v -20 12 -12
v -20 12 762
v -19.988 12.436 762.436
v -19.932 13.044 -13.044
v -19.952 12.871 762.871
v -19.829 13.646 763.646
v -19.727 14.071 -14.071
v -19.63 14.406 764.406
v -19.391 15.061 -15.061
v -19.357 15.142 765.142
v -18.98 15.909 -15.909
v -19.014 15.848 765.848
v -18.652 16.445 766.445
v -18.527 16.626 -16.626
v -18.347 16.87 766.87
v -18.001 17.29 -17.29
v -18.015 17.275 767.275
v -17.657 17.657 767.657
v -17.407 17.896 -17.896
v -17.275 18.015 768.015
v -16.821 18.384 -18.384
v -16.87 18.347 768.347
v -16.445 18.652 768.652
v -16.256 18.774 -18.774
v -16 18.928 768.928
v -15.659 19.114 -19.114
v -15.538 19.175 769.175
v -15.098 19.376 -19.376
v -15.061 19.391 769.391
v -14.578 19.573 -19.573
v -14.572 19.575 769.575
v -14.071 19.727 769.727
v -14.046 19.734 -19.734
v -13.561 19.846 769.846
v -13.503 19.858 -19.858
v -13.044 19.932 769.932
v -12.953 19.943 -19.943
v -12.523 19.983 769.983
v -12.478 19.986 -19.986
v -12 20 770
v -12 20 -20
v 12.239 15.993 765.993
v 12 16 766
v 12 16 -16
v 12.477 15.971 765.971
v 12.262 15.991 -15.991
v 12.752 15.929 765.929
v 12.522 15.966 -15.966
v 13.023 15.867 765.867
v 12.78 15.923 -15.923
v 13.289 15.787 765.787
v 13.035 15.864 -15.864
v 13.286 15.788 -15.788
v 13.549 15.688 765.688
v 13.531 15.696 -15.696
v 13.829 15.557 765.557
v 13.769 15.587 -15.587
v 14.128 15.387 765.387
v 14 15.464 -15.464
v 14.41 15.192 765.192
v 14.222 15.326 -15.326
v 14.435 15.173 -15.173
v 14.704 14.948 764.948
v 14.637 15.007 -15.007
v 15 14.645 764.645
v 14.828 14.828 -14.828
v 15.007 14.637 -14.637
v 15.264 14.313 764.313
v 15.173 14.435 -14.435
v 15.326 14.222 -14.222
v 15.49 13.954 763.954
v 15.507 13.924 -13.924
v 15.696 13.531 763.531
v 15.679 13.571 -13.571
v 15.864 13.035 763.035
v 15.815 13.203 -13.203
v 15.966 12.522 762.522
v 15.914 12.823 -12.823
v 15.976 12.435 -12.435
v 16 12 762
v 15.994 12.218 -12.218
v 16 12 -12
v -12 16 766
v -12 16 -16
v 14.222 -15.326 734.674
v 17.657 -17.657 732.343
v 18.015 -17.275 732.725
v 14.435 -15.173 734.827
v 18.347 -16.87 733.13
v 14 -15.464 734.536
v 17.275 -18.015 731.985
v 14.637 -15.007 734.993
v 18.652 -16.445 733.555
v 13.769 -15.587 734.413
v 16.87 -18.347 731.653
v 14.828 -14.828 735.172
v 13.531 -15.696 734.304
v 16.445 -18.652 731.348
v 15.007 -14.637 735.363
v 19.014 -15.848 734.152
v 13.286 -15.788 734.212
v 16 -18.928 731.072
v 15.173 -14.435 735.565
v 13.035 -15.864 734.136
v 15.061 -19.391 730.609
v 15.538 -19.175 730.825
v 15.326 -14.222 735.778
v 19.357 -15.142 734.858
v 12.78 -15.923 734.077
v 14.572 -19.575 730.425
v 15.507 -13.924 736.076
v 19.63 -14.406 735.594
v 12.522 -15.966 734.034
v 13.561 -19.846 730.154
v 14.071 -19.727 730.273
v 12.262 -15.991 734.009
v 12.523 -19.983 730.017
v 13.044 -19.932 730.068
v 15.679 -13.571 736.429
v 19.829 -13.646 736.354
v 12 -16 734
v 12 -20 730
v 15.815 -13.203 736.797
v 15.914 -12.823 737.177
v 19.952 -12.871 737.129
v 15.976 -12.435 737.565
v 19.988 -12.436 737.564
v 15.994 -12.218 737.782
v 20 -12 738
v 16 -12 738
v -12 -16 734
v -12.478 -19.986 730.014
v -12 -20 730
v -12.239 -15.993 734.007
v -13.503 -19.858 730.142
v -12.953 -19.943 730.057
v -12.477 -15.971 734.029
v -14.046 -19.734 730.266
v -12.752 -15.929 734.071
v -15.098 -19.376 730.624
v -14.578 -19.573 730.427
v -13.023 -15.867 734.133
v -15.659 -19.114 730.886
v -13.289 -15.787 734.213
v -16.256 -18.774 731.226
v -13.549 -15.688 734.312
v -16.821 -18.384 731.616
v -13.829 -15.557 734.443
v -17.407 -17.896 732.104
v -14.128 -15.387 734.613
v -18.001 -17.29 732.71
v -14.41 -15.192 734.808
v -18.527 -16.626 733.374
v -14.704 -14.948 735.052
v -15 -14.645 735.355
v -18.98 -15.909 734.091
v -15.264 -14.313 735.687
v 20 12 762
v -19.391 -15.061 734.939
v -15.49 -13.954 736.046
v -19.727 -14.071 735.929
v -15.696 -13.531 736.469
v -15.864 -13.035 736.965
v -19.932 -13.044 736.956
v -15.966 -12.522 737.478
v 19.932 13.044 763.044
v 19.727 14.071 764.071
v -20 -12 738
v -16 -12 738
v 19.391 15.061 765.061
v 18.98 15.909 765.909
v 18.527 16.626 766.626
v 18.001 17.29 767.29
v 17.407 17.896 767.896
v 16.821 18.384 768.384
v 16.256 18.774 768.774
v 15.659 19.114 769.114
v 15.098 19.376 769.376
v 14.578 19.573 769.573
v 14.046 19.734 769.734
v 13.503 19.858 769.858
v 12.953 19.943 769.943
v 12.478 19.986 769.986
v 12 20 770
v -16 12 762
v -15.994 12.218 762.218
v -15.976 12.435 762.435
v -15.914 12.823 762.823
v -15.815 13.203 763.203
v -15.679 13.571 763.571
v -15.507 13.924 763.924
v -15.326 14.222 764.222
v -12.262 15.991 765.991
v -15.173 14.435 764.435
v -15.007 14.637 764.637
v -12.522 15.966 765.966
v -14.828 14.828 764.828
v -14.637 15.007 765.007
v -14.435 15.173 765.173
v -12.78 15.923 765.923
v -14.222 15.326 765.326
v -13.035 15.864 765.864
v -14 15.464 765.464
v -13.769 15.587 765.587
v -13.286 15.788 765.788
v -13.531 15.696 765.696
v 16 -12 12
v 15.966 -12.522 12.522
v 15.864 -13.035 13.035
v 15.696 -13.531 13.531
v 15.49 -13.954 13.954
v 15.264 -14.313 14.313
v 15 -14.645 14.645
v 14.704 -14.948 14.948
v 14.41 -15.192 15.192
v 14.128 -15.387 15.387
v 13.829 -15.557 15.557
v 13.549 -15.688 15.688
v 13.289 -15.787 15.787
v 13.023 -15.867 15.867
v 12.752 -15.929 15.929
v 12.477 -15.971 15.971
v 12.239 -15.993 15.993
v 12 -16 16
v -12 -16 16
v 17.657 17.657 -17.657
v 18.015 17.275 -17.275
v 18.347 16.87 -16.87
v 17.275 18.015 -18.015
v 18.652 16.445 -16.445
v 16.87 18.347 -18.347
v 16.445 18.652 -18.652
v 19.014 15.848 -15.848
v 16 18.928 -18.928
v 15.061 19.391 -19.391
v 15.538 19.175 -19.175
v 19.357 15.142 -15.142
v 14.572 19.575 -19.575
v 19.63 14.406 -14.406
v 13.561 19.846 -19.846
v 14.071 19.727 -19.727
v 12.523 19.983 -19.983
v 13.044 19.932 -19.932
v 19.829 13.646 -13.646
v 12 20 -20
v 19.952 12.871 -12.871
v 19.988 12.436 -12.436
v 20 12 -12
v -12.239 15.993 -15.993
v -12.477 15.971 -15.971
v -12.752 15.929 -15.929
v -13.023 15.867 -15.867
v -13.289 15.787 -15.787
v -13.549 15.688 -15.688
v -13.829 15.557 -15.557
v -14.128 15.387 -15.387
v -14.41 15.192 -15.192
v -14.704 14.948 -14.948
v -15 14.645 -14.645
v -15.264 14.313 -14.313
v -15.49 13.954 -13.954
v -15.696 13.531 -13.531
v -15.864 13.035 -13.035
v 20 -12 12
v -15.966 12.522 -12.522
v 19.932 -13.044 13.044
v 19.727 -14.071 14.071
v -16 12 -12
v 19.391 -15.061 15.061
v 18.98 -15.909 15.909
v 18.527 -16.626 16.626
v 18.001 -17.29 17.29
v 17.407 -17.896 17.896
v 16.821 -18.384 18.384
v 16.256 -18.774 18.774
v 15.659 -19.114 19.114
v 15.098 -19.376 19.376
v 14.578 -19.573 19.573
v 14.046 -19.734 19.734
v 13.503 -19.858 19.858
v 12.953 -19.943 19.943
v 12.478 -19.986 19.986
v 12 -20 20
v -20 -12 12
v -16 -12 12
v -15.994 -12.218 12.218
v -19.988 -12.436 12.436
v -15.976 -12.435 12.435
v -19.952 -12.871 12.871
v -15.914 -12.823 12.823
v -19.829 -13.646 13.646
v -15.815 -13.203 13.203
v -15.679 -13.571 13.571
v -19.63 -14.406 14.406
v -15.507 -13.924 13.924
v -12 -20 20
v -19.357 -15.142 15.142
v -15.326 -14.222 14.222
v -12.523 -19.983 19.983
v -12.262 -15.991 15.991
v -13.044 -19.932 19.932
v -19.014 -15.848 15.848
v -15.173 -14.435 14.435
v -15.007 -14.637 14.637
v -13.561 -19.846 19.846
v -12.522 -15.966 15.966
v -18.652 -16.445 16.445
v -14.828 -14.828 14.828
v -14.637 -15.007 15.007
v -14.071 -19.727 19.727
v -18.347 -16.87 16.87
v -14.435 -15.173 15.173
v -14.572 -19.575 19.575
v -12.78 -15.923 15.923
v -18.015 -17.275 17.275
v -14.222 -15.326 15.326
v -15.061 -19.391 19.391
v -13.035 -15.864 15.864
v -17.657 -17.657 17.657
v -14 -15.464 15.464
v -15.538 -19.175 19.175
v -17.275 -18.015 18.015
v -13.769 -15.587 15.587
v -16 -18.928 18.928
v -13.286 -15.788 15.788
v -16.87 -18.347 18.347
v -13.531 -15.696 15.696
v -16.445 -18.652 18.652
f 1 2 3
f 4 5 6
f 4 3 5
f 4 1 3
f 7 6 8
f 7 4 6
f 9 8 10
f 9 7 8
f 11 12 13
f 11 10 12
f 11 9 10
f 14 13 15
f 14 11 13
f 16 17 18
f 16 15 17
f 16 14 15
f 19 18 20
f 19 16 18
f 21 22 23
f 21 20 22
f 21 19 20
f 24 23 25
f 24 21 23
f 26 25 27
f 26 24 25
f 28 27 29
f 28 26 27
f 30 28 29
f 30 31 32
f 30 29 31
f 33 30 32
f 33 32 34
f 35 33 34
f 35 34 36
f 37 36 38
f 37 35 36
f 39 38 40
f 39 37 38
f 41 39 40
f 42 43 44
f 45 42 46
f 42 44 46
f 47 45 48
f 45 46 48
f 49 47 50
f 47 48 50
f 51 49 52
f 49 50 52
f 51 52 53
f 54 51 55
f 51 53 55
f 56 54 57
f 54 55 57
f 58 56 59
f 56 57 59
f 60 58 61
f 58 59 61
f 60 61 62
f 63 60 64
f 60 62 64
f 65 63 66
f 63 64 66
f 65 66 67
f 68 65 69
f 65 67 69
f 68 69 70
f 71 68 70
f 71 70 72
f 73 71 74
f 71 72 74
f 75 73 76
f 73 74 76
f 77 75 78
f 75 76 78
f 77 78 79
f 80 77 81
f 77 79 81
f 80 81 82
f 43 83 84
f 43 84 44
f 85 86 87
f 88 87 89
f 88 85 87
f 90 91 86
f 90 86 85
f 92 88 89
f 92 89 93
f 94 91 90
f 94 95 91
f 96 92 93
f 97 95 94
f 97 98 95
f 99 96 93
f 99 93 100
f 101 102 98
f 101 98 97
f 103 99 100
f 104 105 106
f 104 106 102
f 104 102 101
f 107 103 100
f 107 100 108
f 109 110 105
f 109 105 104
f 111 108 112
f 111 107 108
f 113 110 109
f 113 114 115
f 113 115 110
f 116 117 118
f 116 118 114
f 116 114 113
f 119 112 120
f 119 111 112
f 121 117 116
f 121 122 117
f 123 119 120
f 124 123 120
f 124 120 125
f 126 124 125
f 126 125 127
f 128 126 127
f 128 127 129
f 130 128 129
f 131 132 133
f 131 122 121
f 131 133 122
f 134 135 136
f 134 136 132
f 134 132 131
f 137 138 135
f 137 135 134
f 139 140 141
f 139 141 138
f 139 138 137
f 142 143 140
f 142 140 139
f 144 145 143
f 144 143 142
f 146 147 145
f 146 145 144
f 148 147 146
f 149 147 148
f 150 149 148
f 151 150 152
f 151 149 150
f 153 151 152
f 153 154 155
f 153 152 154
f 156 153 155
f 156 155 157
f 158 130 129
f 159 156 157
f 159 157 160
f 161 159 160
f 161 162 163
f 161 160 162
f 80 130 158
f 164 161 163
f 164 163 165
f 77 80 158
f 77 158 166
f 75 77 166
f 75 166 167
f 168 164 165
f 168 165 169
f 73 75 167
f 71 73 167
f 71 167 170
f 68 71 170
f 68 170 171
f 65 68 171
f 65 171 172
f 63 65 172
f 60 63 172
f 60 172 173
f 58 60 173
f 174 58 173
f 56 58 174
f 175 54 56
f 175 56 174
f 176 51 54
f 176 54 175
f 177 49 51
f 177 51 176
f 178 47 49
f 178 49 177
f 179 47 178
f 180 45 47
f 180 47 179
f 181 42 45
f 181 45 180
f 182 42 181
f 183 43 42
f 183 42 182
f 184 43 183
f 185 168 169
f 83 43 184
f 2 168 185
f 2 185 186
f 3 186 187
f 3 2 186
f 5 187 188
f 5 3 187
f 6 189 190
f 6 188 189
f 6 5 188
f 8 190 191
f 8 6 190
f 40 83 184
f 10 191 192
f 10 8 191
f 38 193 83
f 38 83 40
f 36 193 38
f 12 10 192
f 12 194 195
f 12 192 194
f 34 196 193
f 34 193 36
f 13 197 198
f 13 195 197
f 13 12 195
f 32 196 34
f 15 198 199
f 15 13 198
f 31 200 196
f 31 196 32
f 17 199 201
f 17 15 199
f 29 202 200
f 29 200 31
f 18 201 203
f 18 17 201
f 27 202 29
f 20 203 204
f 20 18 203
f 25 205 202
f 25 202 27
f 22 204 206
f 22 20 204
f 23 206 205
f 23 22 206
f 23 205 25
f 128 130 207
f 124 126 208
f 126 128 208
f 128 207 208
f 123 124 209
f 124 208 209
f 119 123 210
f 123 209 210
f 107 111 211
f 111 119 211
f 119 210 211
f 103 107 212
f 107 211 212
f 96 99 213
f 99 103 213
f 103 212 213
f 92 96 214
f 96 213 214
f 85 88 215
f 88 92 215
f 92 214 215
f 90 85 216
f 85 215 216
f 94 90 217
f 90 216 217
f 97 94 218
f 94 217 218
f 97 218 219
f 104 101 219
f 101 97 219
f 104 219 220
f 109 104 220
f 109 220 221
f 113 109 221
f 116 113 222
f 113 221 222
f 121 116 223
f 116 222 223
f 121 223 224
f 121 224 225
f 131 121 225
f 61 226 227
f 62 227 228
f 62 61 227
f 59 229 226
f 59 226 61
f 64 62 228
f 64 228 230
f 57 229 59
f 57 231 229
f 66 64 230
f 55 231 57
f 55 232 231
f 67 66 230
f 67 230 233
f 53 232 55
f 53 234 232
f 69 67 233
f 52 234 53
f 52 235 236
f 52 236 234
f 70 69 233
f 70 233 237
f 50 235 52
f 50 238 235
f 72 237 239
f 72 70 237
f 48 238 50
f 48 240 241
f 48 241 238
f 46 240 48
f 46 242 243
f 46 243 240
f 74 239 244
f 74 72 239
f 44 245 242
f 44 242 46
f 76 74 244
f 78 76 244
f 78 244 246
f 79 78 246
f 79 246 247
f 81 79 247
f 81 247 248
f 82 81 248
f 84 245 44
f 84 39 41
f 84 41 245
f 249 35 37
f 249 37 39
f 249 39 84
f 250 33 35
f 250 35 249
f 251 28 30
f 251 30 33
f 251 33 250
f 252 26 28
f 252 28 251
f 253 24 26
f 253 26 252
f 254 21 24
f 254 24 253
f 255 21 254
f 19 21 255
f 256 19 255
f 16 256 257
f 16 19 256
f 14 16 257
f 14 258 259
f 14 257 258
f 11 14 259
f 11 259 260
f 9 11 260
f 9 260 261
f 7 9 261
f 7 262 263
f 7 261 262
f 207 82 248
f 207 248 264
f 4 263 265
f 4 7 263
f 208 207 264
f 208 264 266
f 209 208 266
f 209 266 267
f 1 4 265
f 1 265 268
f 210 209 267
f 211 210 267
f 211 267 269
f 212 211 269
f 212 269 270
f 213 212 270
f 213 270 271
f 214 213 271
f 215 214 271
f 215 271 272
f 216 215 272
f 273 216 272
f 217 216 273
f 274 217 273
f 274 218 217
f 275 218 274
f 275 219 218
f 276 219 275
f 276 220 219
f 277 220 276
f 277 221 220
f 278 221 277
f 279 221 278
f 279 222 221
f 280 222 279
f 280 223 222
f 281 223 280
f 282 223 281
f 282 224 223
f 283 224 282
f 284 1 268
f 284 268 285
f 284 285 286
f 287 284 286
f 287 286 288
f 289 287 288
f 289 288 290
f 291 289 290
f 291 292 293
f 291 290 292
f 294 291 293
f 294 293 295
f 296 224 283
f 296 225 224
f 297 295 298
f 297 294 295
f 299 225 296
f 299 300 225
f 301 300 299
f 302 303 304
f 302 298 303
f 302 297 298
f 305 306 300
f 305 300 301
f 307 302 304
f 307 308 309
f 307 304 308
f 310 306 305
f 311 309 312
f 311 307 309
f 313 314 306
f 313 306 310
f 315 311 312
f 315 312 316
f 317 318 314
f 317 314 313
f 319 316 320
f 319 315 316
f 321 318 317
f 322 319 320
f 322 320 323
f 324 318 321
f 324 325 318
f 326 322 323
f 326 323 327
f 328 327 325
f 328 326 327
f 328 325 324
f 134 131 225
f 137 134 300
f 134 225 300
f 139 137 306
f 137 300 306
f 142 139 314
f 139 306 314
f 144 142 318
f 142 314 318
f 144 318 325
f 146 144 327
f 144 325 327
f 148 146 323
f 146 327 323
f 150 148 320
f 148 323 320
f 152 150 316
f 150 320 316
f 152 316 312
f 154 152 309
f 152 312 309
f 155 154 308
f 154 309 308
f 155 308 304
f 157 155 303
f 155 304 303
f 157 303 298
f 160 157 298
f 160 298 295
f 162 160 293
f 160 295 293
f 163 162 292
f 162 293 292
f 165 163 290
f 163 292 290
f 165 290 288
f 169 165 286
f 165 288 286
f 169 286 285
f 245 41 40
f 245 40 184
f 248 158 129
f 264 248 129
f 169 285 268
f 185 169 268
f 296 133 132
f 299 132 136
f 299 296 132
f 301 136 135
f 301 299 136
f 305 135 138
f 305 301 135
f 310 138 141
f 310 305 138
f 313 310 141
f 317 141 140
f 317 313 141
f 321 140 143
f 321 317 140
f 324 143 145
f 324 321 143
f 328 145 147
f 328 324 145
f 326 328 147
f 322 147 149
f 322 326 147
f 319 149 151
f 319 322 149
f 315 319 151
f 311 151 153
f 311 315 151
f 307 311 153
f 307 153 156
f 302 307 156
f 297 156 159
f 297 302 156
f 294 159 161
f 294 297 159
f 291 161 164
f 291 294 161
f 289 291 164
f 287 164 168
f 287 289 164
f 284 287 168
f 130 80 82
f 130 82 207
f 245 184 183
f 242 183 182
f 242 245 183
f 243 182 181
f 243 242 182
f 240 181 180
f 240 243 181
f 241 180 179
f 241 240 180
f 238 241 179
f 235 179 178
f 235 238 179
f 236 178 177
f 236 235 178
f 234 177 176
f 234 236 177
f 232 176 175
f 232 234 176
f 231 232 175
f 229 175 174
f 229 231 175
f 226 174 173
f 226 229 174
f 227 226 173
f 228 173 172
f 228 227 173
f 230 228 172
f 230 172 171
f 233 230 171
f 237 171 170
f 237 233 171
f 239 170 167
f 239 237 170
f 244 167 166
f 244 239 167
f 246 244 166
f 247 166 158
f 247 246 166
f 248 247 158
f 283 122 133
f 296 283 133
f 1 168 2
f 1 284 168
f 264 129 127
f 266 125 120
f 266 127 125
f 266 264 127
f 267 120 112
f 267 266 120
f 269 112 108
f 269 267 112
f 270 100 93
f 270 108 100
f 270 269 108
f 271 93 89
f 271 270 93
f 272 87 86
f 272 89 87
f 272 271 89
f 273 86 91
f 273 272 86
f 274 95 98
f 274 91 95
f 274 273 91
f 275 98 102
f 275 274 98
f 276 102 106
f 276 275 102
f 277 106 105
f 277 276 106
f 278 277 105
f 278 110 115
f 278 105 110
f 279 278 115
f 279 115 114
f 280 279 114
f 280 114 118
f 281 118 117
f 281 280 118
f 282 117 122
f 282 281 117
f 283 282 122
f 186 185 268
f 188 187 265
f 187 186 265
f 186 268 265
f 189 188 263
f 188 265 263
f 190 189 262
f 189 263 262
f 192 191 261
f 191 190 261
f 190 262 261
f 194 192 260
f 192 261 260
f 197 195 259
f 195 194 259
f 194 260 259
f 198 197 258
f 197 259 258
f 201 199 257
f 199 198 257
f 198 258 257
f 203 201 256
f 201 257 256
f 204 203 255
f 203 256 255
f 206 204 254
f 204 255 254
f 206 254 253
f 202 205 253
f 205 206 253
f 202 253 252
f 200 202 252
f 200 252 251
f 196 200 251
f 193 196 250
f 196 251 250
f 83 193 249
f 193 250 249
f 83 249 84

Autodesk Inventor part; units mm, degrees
ref_plane "Start plane" through (0, 0, -20) normal (0, 0, 1) x (1, 0, 0)
ref_plane "End plane" through (0, 0, 770) normal (0, 0, 1) x (1, 0, 0)
sketch "Sketch" plane through (0, 0, 0) normal (0, 0, 1) x (1, 0, 0)
  line L0 (-20, -12) -> (-20, 12)
  line L1 (-12, 20) -> (12, 20)
  line L2 (20, 12) -> (20, -12)
  line L3 (12, -20) -> (-12, -20)
  arc A0 (-20, -12) -> (-12, -20) centre (-12, -12) ccw
  arc A1 (-12, 20) -> (-20, 12) centre (-12, 12) ccw
  arc A2 (20, 12) -> (12, 20) centre (12, 12) ccw
  arc A3 (12, -20) -> (20, -12) centre (12, -12) ccw
  arc A4 (-12, 16) -> (-16, 12) centre (-12, 12) ccw
  line L4 (-12, 16) -> (12, 16)
  arc A5 (16, 12) -> (12, 16) centre (12, 12) ccw
  line L5 (16, 12) -> (16, -12)
  arc A6 (12, -16) -> (16, -12) centre (12, -12) ccw
  line L6 (12, -16) -> (-12, -16)
  arc A7 (-16, -12) -> (-12, -16) centre (-12, -12) ccw
  line L7 (-16, -12) -> (-16, 12)
  line L8 (0, 30.3196) -> (0, -30.3196) construction
  line L9 (-30.3196, 0) -> (30.3196, 0) construction
  dimension "d7" = 8
  dimension "d10" = 40
  dimension "d11" = 40
  dimension "d12" = 4
  dimension "d15" = 20
  dimension "d16" = 20
extrude "Body" add sketch "Sketch" along normal up to surface (790 mm away) from surface at -20
sketch "Sketch3" plane through (0, 0, 0) normal (0, 0, 1) x (1, 0, 0)
  line L0 (0, 0) -> (10, 0)
ref_plane "Work Plane3" through (0, 0, 0) normal (0, -1, 0) x (1, 0, 0)
sketch "Sketch4" plane through (0, 0, 0) normal (0, -1, 0) x (1, 0, 0)
  line L0 (-2, -20) -> (12, -20)
  line L1 (-2, 770) -> (12, 770)
  dimension "d18" = 790
ref_plane "Work Plane4" through (0, 20, 770) normal (0, -0.7071, 0.7071) x (1, 0, 0)
split "Split1" plane through (0, 20, 770) removes the side toward (0, -0.7071, 0.7071)
ref_plane "Work Plane5" through (0, 20, -20) normal (0, -0.7071, -0.7071) x (1, 0, 0)
split "Split2" plane through (0, 20, -20) removes the side toward (0, -0.7071, -0.7071)
equation "\"d7\" = G_IR"
equation "\"d10\" = G_H"
equation "\"d11\" = G_W"
equation "\"d12\" = G_T"
equation "\"d15\" = 0.5 * d10"
equation "\"d16\" = 0.5 * d11"
equation "\"d3\" = G_L"
equation "\"G_W\" = 40"
equation "\"G_H\" = 40"
equation "\"G_T\" = 4"
equation "\"G_IR\" = 8"
equation "\"G_L\" = d18"
equation "\"G_OFFSET_START\" = 20"
equation "\"G_OFFSET_END\" = 20"
equation "\"d13\" = -G_OFFSET_START"
equation "\"B_L\" = 750"
properties part number "DIN EN 10219-2 - 40 x 40 x 4  - 790" material "Steel, Mild"
